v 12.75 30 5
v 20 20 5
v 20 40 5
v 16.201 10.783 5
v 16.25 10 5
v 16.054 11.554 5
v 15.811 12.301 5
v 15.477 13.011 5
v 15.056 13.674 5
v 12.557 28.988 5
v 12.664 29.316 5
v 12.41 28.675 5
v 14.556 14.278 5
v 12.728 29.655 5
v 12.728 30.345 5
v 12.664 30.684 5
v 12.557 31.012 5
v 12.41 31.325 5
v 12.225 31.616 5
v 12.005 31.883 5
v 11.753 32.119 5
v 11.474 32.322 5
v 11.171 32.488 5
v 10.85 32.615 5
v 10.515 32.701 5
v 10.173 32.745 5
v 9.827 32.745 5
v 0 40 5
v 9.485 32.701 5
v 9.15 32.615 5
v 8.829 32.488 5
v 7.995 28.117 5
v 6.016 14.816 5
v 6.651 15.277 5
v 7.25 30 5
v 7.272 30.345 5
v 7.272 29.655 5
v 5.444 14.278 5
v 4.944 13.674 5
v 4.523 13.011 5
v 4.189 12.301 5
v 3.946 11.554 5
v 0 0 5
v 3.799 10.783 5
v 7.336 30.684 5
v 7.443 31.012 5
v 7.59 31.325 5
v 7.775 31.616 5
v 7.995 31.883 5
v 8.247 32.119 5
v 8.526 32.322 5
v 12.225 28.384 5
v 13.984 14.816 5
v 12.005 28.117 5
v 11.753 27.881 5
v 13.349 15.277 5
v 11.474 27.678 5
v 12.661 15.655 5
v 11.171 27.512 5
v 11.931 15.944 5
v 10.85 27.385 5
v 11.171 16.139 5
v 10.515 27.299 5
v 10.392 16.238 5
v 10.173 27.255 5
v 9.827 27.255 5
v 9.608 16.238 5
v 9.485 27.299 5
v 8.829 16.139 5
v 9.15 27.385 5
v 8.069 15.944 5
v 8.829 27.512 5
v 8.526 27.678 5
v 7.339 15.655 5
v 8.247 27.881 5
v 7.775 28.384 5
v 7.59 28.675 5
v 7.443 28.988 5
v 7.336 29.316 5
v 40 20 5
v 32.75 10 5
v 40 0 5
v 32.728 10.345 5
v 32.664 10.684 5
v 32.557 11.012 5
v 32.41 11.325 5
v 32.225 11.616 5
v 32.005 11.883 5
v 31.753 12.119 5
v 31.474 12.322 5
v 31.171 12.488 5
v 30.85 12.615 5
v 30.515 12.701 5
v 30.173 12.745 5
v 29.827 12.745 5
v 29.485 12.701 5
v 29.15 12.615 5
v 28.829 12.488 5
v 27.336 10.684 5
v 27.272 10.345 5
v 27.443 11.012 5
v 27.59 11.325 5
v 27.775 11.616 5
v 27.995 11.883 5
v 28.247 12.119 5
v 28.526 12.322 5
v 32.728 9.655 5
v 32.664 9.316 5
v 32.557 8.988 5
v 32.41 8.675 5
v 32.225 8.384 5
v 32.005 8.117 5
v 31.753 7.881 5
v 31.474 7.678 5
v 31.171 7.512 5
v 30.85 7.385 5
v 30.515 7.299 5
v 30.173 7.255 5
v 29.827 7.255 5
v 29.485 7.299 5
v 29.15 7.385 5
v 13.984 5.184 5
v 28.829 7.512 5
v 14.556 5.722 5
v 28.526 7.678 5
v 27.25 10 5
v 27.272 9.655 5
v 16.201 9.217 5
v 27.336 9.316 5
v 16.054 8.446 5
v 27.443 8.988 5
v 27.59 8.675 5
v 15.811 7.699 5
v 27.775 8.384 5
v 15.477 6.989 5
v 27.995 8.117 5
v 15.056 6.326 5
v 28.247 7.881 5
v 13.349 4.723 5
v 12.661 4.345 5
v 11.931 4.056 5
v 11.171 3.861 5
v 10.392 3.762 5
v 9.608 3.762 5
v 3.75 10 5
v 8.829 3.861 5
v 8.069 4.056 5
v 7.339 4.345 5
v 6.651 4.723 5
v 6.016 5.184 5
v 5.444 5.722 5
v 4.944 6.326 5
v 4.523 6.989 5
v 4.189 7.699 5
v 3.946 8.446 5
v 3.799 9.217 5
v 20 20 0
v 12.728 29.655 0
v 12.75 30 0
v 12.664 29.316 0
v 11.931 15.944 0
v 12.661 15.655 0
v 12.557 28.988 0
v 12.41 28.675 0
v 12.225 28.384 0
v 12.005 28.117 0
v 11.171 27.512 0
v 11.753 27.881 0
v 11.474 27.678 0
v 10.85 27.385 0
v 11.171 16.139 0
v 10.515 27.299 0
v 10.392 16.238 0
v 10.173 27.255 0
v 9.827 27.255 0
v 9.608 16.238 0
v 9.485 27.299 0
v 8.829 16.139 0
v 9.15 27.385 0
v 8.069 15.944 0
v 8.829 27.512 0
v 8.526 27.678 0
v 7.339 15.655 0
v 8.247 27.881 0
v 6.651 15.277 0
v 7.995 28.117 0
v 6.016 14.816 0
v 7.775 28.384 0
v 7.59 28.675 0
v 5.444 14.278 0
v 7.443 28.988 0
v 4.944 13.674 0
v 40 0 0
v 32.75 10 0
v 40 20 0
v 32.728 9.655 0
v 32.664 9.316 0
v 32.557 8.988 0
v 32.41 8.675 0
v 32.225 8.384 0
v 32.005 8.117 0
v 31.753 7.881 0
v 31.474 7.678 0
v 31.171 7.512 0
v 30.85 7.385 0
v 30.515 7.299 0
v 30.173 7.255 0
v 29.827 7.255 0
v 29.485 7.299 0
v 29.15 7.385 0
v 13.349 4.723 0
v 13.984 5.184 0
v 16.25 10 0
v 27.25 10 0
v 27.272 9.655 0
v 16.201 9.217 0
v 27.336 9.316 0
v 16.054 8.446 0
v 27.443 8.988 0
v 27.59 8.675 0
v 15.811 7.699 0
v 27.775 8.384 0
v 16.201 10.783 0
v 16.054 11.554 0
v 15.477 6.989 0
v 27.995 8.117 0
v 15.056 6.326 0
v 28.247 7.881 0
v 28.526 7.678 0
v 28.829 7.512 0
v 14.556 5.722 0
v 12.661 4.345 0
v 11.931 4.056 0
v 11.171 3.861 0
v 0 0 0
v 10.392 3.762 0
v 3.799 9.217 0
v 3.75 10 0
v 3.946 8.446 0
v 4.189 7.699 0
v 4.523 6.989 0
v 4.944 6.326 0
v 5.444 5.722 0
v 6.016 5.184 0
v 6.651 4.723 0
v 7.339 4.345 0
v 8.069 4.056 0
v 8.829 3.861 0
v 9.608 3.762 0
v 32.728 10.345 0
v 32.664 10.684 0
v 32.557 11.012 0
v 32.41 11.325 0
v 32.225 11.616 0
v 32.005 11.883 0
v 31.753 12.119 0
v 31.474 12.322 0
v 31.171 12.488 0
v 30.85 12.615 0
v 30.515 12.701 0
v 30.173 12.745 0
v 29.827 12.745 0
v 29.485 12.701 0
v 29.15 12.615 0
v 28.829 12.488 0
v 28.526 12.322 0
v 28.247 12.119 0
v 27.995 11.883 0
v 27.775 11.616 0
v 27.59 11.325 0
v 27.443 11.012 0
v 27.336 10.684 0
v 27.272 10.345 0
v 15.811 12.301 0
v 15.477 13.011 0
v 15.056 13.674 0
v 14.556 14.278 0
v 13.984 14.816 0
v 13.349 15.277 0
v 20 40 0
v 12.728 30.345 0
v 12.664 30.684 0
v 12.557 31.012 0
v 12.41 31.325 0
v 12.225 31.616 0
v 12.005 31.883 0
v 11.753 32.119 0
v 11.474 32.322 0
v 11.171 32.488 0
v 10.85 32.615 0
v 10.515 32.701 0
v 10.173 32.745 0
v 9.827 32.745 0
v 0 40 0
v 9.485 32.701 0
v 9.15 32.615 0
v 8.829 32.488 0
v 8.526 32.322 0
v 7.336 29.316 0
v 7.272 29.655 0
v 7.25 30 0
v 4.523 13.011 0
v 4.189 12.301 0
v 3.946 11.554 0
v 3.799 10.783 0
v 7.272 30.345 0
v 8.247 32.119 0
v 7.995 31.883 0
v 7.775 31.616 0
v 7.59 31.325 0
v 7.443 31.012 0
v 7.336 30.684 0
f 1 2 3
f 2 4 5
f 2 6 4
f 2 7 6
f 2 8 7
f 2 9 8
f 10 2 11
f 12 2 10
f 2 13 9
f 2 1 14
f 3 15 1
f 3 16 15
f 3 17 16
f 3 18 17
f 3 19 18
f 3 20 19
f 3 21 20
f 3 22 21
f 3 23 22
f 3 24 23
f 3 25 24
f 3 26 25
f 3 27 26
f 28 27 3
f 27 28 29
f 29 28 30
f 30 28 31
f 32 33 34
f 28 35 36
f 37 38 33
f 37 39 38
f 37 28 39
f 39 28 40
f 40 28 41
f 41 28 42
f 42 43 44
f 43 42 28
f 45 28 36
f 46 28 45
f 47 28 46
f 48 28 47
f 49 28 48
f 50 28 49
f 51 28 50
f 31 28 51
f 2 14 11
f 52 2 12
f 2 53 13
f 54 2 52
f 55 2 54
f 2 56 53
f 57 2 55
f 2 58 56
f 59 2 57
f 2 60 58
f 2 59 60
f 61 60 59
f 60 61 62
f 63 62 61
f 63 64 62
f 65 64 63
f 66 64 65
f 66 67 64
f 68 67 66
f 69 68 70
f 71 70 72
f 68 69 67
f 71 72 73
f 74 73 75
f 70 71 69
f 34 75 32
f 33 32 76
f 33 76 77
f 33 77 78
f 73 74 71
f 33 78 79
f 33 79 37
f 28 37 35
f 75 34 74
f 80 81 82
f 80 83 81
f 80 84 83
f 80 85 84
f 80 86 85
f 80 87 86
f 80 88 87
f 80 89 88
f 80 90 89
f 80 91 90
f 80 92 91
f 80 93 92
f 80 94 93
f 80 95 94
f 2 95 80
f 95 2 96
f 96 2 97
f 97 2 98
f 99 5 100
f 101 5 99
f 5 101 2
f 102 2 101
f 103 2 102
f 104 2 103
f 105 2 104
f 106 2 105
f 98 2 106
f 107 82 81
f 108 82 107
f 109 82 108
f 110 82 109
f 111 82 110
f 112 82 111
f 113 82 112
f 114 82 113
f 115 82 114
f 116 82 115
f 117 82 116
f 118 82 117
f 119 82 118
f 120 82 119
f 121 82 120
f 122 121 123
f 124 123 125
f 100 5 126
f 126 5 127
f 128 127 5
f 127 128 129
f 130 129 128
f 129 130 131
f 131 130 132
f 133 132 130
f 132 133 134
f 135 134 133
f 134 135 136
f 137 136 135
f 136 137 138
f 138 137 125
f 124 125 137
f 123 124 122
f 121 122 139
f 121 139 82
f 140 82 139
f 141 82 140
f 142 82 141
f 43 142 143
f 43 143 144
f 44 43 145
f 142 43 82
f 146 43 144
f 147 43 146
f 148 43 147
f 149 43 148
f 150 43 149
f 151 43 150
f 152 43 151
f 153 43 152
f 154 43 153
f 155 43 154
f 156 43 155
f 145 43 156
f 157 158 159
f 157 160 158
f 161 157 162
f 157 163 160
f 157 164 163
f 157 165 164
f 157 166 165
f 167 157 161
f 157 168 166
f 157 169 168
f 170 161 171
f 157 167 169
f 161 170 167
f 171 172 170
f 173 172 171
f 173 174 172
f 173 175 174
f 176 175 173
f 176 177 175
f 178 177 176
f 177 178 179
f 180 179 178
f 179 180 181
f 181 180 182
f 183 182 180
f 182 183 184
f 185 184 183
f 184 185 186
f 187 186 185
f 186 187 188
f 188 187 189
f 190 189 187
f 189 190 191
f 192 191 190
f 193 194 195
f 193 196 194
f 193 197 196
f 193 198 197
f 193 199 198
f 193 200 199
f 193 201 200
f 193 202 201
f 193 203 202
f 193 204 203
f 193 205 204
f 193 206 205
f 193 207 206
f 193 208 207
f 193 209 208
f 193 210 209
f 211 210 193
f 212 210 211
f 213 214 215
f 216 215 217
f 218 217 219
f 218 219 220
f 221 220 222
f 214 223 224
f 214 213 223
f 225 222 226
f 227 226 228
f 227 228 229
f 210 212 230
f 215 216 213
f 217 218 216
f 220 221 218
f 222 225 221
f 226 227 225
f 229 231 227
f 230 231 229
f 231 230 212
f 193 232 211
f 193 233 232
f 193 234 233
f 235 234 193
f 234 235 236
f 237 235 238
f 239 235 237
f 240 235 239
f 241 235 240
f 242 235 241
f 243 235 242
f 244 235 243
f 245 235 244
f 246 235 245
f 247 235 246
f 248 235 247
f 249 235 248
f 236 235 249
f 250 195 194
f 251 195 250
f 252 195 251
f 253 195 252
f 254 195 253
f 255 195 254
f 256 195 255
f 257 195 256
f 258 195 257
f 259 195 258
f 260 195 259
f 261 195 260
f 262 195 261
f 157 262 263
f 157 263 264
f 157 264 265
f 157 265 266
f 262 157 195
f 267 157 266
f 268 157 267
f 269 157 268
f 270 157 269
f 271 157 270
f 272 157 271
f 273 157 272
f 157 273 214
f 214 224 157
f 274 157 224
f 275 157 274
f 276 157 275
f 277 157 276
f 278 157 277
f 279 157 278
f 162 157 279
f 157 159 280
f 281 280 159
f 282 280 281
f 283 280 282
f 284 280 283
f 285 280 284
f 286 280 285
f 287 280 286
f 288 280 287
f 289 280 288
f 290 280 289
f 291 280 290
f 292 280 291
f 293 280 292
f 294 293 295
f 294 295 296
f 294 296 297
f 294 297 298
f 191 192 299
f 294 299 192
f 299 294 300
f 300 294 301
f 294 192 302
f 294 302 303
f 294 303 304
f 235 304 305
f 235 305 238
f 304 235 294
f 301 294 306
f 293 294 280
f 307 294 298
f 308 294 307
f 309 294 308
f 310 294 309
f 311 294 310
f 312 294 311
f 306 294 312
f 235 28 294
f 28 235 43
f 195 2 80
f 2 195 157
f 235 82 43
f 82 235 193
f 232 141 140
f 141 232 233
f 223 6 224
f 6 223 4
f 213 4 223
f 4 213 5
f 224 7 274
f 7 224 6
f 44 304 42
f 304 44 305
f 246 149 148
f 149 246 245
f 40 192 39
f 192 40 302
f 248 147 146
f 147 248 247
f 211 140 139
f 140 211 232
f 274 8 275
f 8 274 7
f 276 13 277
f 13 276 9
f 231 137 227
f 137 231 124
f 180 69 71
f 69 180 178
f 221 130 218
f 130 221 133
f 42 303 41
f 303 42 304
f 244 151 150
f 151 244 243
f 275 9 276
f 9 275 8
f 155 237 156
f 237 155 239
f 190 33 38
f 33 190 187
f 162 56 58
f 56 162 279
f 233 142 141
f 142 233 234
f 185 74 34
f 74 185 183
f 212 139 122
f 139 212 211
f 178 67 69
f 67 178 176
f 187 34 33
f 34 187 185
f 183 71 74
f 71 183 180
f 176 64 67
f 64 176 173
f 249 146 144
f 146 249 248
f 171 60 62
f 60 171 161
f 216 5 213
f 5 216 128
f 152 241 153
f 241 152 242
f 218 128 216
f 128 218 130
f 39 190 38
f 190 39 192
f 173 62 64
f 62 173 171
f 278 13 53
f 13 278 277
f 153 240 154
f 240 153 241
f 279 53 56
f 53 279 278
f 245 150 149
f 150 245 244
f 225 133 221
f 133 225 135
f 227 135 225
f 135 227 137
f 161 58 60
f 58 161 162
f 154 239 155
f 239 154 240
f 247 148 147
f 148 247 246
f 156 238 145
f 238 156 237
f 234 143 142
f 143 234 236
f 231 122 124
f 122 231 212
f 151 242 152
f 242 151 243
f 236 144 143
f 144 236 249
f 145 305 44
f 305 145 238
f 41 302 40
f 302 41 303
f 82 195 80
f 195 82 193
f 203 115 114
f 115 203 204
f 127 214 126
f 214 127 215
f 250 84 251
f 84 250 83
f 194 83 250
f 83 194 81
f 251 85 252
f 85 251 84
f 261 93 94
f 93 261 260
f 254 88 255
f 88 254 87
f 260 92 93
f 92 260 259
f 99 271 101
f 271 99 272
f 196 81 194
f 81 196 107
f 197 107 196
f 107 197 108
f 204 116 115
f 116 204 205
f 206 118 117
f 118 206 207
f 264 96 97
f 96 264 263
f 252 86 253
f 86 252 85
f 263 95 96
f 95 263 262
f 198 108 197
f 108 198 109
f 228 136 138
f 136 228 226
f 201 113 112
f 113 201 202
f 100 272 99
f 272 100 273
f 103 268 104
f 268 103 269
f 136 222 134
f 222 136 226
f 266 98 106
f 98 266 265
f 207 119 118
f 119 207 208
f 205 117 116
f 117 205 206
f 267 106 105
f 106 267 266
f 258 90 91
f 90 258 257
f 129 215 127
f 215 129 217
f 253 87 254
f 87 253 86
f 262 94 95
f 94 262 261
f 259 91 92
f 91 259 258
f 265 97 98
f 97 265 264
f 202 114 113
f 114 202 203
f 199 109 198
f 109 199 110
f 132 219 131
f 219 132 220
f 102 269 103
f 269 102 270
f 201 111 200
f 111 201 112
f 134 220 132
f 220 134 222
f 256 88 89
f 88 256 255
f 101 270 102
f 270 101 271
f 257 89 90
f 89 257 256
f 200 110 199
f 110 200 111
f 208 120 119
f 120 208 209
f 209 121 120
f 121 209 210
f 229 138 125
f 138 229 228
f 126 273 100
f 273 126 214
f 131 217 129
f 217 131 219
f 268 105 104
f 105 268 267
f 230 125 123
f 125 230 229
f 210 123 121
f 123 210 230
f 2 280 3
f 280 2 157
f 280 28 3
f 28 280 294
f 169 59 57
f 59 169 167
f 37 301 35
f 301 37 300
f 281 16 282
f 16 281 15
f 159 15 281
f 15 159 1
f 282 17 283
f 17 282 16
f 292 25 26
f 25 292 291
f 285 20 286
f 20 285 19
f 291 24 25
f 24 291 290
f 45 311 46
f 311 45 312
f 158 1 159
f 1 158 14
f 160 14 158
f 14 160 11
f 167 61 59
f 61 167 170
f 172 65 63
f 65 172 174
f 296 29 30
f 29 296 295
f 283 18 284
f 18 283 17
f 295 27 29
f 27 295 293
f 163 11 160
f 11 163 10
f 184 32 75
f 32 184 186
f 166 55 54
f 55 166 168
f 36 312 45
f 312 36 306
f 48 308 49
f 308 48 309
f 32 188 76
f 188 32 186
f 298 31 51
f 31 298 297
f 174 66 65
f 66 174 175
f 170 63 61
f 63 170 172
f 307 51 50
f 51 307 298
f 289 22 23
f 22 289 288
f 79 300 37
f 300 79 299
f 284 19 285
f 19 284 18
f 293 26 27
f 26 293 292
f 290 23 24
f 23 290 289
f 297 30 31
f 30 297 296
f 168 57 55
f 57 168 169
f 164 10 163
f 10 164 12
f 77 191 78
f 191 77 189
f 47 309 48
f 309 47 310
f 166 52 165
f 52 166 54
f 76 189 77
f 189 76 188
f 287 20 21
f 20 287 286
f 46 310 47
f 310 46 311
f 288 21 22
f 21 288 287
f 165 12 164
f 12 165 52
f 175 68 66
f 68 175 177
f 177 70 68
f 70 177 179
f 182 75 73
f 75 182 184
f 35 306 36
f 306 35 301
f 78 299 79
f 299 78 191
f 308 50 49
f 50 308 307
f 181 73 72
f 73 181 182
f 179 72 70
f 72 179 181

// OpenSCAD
$fn = 50;

//switch size
switch = 12.5;

//screw size
screw = 5.5;

//extrusion size
extrusion = 20;

//plate thickness
thickness = 5;

//sides (2 = side by side, 3 = L shaped, 4 = square) 
side = 3;

difference()
{
    cube([extrusion,extrusion,thickness]);
    translate([extrusion/2, extrusion/2, 0]) cylinder(r = switch/2, h = thickness);    
}

translate([extrusion,0,0])
{
    difference()
    {
        cube([extrusion,extrusion,thickness]);
        translate([extrusion/2, extrusion/2, 0]) cylinder(r = screw/2, h = thickness); 
    }
}

if (side >= 3 )
    {
        translate([0,extrusion,0])
        {
            difference()
            {
            cube([extrusion,extrusion,thickness]);
            translate([extrusion/2, extrusion/2, 0]) cylinder(r = screw/2, h = thickness); 
            }
        }
    }
    
if (side == 4)
    {
        translate([extrusion,extrusion,0])
        {
            difference()
            {
               cube([extrusion,extrusion,thickness]);
               translate([extrusion/2, extrusion/2, 0]) cylinder(r = screw/2, h = thickness); 
            }
        }
    }
    
